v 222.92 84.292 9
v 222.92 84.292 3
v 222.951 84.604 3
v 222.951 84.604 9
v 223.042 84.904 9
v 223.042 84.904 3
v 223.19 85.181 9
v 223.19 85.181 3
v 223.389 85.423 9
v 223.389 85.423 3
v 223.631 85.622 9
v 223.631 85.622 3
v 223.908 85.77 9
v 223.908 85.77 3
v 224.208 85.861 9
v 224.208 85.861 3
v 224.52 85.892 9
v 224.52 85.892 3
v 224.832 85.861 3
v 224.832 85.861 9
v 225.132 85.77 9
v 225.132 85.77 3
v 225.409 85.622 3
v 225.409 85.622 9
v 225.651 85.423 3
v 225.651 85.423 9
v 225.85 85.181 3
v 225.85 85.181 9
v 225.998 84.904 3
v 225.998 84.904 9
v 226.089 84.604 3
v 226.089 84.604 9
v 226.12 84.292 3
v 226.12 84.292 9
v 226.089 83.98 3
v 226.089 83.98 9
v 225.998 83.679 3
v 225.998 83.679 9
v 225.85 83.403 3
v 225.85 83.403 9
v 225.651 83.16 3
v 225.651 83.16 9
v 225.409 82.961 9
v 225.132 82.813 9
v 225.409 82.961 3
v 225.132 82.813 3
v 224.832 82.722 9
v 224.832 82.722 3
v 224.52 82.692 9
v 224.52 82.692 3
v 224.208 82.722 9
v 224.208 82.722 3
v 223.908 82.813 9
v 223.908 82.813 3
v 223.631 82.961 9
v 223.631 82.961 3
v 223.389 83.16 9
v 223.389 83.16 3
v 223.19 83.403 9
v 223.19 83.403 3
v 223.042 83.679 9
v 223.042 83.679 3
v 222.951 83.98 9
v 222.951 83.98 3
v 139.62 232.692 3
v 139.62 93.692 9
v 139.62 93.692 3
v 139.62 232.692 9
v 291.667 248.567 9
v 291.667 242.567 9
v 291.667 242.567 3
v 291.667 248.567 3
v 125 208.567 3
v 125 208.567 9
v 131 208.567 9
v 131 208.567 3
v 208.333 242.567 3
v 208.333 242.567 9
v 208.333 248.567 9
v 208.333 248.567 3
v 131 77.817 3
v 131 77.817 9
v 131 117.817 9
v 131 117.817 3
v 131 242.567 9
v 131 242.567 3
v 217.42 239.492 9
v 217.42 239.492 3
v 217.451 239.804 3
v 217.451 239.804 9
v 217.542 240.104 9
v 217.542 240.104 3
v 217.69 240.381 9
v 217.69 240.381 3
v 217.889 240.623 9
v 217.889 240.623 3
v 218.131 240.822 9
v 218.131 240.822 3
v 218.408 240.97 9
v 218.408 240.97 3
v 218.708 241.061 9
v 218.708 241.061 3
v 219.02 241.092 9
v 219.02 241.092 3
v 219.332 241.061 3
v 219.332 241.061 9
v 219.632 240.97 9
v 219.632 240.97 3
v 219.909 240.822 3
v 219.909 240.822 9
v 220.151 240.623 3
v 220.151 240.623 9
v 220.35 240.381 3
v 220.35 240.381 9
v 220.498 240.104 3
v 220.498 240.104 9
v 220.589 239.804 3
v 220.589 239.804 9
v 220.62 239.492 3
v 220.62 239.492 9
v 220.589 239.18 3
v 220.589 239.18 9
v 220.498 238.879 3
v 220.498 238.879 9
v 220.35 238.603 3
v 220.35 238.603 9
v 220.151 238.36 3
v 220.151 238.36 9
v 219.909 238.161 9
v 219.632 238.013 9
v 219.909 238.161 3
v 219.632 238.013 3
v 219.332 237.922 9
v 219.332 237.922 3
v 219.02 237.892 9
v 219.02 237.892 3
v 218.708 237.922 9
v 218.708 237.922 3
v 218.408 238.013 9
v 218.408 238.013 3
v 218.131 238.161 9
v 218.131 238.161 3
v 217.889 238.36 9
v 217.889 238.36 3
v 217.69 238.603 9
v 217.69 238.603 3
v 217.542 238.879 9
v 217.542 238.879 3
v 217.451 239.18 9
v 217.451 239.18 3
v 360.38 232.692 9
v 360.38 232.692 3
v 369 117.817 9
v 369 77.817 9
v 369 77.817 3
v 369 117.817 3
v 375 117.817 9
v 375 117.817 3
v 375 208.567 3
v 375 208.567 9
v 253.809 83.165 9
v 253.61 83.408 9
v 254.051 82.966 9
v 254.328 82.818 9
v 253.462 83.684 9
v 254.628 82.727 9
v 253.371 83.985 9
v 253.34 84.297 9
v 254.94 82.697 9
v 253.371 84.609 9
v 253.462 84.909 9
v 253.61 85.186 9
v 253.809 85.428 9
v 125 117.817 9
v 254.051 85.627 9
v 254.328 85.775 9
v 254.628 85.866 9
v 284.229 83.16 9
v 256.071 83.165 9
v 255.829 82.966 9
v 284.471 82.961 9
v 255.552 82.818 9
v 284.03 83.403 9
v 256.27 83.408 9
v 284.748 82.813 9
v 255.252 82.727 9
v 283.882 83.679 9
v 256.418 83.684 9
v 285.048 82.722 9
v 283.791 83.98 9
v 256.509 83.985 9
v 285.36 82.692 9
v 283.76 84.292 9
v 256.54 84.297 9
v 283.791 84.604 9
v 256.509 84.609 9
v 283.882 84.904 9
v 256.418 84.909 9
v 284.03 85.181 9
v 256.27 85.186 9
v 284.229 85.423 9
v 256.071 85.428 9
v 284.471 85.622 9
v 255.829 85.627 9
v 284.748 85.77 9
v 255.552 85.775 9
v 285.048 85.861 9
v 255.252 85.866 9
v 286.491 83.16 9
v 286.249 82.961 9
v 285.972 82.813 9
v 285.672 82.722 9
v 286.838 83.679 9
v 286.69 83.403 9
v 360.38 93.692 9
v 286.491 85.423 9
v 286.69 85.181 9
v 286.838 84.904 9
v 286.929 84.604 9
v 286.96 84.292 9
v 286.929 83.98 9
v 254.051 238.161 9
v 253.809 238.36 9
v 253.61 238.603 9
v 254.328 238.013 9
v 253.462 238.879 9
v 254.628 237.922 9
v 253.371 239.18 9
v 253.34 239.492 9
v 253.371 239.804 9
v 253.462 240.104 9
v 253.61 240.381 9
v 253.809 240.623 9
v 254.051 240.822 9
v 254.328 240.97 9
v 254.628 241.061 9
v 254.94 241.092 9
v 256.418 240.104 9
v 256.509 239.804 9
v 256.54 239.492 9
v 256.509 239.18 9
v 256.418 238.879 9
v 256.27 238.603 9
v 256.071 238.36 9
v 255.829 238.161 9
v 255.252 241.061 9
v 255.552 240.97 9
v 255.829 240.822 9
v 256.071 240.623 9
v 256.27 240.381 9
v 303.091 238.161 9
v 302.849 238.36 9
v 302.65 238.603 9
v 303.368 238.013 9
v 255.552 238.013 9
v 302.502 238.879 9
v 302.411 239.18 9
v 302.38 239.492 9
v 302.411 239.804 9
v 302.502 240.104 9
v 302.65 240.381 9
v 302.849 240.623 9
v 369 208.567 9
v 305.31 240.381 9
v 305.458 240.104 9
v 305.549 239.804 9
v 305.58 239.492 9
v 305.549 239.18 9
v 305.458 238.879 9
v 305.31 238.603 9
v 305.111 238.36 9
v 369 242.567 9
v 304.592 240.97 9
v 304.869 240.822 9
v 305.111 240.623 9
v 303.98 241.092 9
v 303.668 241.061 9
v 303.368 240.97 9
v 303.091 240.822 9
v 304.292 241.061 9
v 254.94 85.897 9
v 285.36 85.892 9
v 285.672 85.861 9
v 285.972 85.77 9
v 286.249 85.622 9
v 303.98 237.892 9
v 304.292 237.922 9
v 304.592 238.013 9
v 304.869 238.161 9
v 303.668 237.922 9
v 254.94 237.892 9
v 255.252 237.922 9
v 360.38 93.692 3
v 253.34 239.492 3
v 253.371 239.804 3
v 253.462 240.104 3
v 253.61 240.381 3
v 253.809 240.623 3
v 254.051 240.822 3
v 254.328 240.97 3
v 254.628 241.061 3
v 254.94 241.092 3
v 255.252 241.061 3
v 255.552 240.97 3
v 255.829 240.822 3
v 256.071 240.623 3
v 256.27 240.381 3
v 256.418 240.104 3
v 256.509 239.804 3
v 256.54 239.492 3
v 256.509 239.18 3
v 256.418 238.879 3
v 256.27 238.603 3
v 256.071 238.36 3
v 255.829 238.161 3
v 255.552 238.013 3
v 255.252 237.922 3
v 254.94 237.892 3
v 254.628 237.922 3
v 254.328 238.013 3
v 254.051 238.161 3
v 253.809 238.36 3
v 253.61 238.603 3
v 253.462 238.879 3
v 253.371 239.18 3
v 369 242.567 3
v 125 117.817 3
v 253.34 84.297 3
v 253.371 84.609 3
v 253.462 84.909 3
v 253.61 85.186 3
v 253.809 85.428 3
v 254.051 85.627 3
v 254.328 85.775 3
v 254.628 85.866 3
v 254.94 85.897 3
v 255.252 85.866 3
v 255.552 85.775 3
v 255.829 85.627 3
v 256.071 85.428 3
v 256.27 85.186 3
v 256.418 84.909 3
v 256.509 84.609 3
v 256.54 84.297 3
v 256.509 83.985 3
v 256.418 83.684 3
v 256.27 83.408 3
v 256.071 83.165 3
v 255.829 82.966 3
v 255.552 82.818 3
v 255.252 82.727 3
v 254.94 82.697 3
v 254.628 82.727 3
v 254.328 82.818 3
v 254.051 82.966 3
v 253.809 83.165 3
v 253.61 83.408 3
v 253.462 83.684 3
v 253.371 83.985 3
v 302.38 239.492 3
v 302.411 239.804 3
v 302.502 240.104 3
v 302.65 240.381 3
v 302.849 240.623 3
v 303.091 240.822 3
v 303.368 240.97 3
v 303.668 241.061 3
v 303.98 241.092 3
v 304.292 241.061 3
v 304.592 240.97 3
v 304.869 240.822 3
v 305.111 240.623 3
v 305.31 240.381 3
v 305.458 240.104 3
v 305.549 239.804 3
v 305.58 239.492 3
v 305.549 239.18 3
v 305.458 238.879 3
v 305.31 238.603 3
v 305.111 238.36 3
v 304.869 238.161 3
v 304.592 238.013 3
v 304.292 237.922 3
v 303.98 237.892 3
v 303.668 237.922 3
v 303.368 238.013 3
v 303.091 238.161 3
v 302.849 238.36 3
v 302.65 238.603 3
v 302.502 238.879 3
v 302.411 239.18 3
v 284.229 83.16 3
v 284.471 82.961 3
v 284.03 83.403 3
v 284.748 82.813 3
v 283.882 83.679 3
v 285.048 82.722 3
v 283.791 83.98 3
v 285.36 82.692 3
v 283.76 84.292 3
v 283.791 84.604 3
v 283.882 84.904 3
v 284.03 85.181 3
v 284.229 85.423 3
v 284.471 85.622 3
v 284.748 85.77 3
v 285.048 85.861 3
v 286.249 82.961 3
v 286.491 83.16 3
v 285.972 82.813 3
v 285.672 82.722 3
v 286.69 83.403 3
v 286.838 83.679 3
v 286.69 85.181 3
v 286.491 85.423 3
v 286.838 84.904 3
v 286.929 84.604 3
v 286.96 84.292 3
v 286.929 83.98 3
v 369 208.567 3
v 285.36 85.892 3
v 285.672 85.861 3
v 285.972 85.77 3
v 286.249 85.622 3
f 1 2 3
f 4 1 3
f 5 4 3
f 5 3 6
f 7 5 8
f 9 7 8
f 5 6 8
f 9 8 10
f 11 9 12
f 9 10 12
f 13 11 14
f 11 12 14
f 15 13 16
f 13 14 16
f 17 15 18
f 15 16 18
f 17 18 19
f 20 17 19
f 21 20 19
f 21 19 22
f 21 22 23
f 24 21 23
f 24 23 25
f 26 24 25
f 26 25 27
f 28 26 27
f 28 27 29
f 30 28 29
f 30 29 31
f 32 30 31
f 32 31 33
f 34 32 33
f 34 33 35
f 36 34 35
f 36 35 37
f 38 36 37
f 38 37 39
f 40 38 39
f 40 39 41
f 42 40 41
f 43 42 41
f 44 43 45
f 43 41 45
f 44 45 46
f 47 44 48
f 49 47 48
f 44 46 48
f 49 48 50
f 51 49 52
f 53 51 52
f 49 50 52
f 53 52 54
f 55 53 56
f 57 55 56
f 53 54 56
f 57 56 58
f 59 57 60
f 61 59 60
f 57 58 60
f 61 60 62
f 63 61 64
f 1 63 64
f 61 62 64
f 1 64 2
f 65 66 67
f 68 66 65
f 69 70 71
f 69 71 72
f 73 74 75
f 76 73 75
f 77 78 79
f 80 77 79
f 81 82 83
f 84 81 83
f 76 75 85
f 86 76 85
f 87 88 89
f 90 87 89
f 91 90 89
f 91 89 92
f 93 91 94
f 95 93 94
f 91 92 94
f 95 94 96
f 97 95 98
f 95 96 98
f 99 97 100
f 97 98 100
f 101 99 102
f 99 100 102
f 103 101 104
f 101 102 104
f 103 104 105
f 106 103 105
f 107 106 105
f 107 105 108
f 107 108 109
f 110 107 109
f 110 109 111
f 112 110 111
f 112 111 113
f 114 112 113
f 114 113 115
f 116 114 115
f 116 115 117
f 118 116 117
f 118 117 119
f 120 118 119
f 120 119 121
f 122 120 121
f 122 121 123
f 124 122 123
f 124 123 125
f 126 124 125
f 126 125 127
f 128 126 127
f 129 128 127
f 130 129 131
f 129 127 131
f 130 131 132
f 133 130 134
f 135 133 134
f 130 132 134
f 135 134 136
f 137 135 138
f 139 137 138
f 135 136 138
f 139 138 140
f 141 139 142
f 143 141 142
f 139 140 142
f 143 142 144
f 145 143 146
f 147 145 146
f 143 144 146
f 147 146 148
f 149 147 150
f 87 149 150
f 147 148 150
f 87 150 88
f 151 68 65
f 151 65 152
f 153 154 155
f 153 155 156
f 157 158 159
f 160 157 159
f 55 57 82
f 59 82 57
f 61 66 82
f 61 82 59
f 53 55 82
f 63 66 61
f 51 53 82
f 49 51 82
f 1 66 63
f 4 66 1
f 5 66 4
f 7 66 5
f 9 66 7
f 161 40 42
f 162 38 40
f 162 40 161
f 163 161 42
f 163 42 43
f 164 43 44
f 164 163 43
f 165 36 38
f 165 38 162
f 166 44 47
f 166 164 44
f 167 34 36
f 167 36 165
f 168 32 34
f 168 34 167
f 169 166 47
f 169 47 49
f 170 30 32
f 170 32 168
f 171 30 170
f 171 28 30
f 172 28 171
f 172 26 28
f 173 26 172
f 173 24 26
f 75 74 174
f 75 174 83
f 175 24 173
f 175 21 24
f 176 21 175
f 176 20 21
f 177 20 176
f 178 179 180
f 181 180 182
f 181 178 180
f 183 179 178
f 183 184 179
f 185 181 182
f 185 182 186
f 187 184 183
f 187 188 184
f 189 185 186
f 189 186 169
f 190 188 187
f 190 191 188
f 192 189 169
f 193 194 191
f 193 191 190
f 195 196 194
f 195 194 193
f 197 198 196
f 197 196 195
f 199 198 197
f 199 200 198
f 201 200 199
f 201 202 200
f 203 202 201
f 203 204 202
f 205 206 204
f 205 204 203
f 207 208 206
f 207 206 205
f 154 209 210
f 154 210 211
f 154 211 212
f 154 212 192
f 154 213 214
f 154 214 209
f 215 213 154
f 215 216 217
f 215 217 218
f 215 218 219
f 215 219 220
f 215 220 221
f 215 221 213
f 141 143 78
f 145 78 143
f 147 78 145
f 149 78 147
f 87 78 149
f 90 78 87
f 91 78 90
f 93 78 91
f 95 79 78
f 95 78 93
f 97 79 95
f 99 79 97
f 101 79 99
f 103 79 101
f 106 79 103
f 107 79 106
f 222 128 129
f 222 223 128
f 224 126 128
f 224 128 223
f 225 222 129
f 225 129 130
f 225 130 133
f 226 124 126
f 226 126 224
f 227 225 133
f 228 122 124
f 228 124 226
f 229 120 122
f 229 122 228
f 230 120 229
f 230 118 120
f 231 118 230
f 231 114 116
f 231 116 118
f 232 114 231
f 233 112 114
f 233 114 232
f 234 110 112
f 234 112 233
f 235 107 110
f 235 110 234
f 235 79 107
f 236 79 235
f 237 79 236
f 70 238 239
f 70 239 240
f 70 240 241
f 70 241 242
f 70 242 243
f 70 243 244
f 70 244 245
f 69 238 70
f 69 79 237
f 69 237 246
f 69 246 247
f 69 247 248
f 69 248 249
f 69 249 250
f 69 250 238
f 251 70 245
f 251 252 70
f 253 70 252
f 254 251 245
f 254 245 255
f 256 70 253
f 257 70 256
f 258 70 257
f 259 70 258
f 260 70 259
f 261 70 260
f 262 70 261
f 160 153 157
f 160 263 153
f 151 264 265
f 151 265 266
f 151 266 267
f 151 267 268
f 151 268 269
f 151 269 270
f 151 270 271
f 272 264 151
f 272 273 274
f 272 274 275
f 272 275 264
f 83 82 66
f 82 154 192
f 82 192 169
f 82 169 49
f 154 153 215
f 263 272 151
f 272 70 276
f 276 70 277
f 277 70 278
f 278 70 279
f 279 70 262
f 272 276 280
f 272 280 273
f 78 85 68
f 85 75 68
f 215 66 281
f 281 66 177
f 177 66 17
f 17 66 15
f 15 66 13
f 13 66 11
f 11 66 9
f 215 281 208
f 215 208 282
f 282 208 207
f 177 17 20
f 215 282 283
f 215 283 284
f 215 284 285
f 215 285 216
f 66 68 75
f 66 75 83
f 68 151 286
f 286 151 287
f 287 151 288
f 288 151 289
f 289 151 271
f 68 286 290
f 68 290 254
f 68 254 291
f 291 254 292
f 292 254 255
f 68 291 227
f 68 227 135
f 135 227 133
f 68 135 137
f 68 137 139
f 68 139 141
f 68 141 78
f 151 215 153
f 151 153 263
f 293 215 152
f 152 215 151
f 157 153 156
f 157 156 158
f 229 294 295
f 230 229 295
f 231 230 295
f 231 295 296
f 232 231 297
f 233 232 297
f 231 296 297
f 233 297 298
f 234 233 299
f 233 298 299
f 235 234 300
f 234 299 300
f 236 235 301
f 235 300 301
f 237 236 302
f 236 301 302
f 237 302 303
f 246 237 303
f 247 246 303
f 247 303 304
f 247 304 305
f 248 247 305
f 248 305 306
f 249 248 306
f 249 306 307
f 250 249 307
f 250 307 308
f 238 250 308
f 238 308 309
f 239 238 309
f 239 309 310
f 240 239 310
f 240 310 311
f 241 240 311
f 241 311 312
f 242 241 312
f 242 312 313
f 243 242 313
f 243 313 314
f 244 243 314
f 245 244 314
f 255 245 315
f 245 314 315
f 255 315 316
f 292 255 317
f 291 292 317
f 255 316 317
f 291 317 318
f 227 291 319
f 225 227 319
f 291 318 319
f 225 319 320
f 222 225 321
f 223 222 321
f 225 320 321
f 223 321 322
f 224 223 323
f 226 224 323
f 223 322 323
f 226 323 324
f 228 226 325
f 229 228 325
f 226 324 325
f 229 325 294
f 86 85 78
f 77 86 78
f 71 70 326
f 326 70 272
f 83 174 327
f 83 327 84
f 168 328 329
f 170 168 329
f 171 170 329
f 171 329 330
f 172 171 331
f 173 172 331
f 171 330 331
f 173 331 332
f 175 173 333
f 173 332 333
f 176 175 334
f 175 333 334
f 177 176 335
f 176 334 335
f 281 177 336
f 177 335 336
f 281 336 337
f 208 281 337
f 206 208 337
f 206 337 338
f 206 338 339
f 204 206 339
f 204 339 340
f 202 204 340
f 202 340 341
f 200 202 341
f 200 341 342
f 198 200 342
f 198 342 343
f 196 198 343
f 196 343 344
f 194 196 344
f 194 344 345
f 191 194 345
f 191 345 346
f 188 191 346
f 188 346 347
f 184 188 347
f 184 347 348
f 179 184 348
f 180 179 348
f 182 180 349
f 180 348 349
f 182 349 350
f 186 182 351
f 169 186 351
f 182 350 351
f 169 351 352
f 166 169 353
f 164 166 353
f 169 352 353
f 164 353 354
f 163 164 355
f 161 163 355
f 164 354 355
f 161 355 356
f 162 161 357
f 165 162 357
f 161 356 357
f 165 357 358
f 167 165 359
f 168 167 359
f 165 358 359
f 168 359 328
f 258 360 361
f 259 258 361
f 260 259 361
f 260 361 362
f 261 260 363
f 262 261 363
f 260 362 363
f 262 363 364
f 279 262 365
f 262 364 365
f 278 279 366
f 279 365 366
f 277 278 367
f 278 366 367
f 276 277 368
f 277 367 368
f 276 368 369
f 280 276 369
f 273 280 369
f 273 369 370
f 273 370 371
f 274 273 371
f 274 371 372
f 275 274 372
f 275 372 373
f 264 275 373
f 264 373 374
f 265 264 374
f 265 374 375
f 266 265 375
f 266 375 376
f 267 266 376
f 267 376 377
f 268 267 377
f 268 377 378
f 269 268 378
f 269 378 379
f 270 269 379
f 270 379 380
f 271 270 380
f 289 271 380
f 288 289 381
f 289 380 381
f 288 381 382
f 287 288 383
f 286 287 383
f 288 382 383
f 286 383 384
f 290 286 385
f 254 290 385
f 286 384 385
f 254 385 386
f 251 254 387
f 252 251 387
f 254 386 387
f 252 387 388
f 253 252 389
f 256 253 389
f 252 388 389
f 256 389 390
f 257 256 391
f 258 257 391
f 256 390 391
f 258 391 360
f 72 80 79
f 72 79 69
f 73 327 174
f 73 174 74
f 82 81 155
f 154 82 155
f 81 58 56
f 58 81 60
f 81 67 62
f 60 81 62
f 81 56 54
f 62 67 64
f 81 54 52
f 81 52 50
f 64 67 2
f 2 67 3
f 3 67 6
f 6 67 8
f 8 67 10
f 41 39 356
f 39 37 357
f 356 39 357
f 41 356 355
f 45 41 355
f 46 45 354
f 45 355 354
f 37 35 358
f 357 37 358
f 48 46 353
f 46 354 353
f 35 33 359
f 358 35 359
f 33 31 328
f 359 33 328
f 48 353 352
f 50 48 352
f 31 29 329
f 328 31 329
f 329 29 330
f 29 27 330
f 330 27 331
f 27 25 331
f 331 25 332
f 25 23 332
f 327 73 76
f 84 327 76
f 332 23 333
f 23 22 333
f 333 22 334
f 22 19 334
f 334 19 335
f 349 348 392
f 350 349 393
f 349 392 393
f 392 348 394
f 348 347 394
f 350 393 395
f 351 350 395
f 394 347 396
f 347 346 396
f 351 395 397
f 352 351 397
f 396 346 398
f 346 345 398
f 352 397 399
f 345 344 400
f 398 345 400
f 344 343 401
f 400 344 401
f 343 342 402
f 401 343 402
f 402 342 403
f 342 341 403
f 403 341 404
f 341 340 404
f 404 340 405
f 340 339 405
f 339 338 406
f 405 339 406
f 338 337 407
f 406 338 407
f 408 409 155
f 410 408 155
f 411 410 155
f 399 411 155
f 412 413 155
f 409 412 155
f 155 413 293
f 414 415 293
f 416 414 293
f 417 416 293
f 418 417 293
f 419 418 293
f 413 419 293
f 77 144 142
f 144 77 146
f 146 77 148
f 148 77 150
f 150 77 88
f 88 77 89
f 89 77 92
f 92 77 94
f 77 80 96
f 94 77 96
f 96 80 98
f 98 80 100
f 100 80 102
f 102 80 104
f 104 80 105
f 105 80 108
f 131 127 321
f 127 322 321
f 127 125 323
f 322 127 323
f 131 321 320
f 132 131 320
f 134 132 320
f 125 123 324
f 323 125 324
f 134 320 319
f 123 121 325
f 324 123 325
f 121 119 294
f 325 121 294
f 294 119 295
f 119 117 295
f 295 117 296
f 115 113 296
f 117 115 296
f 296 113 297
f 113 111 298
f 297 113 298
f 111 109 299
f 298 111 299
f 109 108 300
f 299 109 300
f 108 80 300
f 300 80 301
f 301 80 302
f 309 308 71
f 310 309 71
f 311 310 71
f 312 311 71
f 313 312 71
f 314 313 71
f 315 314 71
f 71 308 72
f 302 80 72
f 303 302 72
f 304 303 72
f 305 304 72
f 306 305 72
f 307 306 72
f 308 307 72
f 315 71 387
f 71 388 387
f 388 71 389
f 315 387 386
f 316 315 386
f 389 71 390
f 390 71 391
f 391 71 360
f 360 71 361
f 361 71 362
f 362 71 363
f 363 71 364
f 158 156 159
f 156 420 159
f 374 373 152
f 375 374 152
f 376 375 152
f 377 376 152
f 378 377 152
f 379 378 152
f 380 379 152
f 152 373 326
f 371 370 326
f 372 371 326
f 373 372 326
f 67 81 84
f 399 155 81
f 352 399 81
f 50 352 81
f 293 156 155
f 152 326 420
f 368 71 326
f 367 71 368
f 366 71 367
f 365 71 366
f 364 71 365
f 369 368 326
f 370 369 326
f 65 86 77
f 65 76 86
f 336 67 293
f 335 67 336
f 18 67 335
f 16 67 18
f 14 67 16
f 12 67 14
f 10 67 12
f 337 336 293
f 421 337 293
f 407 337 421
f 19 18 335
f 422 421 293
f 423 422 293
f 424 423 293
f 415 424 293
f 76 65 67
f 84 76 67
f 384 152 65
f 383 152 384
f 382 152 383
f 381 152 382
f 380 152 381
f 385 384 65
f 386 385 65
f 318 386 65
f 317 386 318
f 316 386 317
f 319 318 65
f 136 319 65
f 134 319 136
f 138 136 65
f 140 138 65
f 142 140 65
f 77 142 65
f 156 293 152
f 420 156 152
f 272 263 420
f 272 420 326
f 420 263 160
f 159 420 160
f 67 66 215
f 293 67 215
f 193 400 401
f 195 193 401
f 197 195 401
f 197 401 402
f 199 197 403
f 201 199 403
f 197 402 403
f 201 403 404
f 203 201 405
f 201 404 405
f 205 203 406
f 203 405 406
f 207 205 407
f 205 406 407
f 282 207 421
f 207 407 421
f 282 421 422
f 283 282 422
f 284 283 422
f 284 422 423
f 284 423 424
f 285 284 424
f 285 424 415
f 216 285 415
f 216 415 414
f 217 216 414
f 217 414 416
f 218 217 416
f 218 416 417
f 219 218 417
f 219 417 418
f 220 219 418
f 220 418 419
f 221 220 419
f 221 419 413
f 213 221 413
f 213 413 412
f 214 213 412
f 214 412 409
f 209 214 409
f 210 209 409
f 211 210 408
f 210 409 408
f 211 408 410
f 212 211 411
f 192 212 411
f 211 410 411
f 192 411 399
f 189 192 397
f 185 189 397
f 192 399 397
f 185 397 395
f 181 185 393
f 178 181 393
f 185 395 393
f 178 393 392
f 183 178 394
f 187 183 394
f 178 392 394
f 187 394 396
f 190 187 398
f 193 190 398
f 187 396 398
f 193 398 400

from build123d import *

# Parameters (mm, degrees)
SKETCH1_W            = 500
SKETCH1_H            = 341.5
BOSS_EXTRUDE1_DEPTH  = 12
SKETCH5_W            = 12
SKETCH5_H            = 80
CUT_EXTRUDE2_DEPTH   = 606.612293468
SKETCH3_W            = 441.52
SKETCH3_H            = 278
CUT_EXTRUDE3_DEPTH   = 606.612293468
SKETCH6_W            = 154.666666667
SKETCH6_H            = 12
CUT_EXTRUDE4_DEPTH   = 606.612293468
SCALE1_SCALE         = 0.5
M3_CLEARANCE_SLOT1_D = 3.2
M3_CLEARANCE_SLOT2_D = 3.2


with BuildPart() as part:
    # Sketch1 → Boss-Extrude1 (new body)
    with BuildSketch(Plane.XY):
        with Locations((250, 170.75)):
            Rectangle(SKETCH1_W, SKETCH1_H)
    extrude(amount=BOSS_EXTRUDE1_DEPTH)

    # Sketch5 → Cut-Extrude2 (cut, through all)
    with BuildSketch(Plane.XY.offset(12)):
        with Locations((6, 301.5)):
            Rectangle(SKETCH5_W, SKETCH5_H)
        with Locations((6, 40)):
            Rectangle(SKETCH5_W, SKETCH5_H)
        with Locations((494, 301.5)):
            Rectangle(SKETCH5_W, SKETCH5_H)
        with Locations((494, 40)):
            Rectangle(SKETCH5_W, SKETCH5_H)
    extrude(amount=-CUT_EXTRUDE2_DEPTH, mode=Mode.SUBTRACT)

    # Sketch3 → Cut-Extrude3 (cut, through all)
    with BuildSketch(Plane.XY.offset(12)):
        with Locations((250, 170.75)):
            Rectangle(SKETCH3_W, SKETCH3_H)
    extrude(amount=-CUT_EXTRUDE3_DEPTH, mode=Mode.SUBTRACT)

    # Sketch6 → Cut-Extrude4 (cut, through all)
    with BuildSketch(Plane.XY.offset(12)):
        with Locations((410.666666667, 335.5)):
            Rectangle(SKETCH6_W, SKETCH6_H)
        with Locations((89.333333334, 335.5)):
            Rectangle(SKETCH6_W, SKETCH6_H)
    extrude(amount=-CUT_EXTRUDE4_DEPTH, mode=Mode.SUBTRACT)


with BuildPart() as part_1:
    # Scale1: scaled about (250, 155.633318535, 6)
    add(part.part.scale(SCALE1_SCALE).moved(Location((125, 77.816659268, 3))))

    # M3 Clearance Slot1 (through all)
    with Locations(Plane.XY.offset(9)):
        with Locations((219.02, 239.491659268), (303.98, 239.491659268), (224.52, 84.291659268), (285.36, 84.291659268)):
            Hole(M3_CLEARANCE_SLOT1_D / 2)

    # M3 Clearance Slot2 (through all)
    with Locations(Plane.XY.offset(9)):
        with Locations((254.94, 84.296659268), (254.94, 239.491659268)):
            Hole(M3_CLEARANCE_SLOT2_D / 2)


solid = part_1.part
